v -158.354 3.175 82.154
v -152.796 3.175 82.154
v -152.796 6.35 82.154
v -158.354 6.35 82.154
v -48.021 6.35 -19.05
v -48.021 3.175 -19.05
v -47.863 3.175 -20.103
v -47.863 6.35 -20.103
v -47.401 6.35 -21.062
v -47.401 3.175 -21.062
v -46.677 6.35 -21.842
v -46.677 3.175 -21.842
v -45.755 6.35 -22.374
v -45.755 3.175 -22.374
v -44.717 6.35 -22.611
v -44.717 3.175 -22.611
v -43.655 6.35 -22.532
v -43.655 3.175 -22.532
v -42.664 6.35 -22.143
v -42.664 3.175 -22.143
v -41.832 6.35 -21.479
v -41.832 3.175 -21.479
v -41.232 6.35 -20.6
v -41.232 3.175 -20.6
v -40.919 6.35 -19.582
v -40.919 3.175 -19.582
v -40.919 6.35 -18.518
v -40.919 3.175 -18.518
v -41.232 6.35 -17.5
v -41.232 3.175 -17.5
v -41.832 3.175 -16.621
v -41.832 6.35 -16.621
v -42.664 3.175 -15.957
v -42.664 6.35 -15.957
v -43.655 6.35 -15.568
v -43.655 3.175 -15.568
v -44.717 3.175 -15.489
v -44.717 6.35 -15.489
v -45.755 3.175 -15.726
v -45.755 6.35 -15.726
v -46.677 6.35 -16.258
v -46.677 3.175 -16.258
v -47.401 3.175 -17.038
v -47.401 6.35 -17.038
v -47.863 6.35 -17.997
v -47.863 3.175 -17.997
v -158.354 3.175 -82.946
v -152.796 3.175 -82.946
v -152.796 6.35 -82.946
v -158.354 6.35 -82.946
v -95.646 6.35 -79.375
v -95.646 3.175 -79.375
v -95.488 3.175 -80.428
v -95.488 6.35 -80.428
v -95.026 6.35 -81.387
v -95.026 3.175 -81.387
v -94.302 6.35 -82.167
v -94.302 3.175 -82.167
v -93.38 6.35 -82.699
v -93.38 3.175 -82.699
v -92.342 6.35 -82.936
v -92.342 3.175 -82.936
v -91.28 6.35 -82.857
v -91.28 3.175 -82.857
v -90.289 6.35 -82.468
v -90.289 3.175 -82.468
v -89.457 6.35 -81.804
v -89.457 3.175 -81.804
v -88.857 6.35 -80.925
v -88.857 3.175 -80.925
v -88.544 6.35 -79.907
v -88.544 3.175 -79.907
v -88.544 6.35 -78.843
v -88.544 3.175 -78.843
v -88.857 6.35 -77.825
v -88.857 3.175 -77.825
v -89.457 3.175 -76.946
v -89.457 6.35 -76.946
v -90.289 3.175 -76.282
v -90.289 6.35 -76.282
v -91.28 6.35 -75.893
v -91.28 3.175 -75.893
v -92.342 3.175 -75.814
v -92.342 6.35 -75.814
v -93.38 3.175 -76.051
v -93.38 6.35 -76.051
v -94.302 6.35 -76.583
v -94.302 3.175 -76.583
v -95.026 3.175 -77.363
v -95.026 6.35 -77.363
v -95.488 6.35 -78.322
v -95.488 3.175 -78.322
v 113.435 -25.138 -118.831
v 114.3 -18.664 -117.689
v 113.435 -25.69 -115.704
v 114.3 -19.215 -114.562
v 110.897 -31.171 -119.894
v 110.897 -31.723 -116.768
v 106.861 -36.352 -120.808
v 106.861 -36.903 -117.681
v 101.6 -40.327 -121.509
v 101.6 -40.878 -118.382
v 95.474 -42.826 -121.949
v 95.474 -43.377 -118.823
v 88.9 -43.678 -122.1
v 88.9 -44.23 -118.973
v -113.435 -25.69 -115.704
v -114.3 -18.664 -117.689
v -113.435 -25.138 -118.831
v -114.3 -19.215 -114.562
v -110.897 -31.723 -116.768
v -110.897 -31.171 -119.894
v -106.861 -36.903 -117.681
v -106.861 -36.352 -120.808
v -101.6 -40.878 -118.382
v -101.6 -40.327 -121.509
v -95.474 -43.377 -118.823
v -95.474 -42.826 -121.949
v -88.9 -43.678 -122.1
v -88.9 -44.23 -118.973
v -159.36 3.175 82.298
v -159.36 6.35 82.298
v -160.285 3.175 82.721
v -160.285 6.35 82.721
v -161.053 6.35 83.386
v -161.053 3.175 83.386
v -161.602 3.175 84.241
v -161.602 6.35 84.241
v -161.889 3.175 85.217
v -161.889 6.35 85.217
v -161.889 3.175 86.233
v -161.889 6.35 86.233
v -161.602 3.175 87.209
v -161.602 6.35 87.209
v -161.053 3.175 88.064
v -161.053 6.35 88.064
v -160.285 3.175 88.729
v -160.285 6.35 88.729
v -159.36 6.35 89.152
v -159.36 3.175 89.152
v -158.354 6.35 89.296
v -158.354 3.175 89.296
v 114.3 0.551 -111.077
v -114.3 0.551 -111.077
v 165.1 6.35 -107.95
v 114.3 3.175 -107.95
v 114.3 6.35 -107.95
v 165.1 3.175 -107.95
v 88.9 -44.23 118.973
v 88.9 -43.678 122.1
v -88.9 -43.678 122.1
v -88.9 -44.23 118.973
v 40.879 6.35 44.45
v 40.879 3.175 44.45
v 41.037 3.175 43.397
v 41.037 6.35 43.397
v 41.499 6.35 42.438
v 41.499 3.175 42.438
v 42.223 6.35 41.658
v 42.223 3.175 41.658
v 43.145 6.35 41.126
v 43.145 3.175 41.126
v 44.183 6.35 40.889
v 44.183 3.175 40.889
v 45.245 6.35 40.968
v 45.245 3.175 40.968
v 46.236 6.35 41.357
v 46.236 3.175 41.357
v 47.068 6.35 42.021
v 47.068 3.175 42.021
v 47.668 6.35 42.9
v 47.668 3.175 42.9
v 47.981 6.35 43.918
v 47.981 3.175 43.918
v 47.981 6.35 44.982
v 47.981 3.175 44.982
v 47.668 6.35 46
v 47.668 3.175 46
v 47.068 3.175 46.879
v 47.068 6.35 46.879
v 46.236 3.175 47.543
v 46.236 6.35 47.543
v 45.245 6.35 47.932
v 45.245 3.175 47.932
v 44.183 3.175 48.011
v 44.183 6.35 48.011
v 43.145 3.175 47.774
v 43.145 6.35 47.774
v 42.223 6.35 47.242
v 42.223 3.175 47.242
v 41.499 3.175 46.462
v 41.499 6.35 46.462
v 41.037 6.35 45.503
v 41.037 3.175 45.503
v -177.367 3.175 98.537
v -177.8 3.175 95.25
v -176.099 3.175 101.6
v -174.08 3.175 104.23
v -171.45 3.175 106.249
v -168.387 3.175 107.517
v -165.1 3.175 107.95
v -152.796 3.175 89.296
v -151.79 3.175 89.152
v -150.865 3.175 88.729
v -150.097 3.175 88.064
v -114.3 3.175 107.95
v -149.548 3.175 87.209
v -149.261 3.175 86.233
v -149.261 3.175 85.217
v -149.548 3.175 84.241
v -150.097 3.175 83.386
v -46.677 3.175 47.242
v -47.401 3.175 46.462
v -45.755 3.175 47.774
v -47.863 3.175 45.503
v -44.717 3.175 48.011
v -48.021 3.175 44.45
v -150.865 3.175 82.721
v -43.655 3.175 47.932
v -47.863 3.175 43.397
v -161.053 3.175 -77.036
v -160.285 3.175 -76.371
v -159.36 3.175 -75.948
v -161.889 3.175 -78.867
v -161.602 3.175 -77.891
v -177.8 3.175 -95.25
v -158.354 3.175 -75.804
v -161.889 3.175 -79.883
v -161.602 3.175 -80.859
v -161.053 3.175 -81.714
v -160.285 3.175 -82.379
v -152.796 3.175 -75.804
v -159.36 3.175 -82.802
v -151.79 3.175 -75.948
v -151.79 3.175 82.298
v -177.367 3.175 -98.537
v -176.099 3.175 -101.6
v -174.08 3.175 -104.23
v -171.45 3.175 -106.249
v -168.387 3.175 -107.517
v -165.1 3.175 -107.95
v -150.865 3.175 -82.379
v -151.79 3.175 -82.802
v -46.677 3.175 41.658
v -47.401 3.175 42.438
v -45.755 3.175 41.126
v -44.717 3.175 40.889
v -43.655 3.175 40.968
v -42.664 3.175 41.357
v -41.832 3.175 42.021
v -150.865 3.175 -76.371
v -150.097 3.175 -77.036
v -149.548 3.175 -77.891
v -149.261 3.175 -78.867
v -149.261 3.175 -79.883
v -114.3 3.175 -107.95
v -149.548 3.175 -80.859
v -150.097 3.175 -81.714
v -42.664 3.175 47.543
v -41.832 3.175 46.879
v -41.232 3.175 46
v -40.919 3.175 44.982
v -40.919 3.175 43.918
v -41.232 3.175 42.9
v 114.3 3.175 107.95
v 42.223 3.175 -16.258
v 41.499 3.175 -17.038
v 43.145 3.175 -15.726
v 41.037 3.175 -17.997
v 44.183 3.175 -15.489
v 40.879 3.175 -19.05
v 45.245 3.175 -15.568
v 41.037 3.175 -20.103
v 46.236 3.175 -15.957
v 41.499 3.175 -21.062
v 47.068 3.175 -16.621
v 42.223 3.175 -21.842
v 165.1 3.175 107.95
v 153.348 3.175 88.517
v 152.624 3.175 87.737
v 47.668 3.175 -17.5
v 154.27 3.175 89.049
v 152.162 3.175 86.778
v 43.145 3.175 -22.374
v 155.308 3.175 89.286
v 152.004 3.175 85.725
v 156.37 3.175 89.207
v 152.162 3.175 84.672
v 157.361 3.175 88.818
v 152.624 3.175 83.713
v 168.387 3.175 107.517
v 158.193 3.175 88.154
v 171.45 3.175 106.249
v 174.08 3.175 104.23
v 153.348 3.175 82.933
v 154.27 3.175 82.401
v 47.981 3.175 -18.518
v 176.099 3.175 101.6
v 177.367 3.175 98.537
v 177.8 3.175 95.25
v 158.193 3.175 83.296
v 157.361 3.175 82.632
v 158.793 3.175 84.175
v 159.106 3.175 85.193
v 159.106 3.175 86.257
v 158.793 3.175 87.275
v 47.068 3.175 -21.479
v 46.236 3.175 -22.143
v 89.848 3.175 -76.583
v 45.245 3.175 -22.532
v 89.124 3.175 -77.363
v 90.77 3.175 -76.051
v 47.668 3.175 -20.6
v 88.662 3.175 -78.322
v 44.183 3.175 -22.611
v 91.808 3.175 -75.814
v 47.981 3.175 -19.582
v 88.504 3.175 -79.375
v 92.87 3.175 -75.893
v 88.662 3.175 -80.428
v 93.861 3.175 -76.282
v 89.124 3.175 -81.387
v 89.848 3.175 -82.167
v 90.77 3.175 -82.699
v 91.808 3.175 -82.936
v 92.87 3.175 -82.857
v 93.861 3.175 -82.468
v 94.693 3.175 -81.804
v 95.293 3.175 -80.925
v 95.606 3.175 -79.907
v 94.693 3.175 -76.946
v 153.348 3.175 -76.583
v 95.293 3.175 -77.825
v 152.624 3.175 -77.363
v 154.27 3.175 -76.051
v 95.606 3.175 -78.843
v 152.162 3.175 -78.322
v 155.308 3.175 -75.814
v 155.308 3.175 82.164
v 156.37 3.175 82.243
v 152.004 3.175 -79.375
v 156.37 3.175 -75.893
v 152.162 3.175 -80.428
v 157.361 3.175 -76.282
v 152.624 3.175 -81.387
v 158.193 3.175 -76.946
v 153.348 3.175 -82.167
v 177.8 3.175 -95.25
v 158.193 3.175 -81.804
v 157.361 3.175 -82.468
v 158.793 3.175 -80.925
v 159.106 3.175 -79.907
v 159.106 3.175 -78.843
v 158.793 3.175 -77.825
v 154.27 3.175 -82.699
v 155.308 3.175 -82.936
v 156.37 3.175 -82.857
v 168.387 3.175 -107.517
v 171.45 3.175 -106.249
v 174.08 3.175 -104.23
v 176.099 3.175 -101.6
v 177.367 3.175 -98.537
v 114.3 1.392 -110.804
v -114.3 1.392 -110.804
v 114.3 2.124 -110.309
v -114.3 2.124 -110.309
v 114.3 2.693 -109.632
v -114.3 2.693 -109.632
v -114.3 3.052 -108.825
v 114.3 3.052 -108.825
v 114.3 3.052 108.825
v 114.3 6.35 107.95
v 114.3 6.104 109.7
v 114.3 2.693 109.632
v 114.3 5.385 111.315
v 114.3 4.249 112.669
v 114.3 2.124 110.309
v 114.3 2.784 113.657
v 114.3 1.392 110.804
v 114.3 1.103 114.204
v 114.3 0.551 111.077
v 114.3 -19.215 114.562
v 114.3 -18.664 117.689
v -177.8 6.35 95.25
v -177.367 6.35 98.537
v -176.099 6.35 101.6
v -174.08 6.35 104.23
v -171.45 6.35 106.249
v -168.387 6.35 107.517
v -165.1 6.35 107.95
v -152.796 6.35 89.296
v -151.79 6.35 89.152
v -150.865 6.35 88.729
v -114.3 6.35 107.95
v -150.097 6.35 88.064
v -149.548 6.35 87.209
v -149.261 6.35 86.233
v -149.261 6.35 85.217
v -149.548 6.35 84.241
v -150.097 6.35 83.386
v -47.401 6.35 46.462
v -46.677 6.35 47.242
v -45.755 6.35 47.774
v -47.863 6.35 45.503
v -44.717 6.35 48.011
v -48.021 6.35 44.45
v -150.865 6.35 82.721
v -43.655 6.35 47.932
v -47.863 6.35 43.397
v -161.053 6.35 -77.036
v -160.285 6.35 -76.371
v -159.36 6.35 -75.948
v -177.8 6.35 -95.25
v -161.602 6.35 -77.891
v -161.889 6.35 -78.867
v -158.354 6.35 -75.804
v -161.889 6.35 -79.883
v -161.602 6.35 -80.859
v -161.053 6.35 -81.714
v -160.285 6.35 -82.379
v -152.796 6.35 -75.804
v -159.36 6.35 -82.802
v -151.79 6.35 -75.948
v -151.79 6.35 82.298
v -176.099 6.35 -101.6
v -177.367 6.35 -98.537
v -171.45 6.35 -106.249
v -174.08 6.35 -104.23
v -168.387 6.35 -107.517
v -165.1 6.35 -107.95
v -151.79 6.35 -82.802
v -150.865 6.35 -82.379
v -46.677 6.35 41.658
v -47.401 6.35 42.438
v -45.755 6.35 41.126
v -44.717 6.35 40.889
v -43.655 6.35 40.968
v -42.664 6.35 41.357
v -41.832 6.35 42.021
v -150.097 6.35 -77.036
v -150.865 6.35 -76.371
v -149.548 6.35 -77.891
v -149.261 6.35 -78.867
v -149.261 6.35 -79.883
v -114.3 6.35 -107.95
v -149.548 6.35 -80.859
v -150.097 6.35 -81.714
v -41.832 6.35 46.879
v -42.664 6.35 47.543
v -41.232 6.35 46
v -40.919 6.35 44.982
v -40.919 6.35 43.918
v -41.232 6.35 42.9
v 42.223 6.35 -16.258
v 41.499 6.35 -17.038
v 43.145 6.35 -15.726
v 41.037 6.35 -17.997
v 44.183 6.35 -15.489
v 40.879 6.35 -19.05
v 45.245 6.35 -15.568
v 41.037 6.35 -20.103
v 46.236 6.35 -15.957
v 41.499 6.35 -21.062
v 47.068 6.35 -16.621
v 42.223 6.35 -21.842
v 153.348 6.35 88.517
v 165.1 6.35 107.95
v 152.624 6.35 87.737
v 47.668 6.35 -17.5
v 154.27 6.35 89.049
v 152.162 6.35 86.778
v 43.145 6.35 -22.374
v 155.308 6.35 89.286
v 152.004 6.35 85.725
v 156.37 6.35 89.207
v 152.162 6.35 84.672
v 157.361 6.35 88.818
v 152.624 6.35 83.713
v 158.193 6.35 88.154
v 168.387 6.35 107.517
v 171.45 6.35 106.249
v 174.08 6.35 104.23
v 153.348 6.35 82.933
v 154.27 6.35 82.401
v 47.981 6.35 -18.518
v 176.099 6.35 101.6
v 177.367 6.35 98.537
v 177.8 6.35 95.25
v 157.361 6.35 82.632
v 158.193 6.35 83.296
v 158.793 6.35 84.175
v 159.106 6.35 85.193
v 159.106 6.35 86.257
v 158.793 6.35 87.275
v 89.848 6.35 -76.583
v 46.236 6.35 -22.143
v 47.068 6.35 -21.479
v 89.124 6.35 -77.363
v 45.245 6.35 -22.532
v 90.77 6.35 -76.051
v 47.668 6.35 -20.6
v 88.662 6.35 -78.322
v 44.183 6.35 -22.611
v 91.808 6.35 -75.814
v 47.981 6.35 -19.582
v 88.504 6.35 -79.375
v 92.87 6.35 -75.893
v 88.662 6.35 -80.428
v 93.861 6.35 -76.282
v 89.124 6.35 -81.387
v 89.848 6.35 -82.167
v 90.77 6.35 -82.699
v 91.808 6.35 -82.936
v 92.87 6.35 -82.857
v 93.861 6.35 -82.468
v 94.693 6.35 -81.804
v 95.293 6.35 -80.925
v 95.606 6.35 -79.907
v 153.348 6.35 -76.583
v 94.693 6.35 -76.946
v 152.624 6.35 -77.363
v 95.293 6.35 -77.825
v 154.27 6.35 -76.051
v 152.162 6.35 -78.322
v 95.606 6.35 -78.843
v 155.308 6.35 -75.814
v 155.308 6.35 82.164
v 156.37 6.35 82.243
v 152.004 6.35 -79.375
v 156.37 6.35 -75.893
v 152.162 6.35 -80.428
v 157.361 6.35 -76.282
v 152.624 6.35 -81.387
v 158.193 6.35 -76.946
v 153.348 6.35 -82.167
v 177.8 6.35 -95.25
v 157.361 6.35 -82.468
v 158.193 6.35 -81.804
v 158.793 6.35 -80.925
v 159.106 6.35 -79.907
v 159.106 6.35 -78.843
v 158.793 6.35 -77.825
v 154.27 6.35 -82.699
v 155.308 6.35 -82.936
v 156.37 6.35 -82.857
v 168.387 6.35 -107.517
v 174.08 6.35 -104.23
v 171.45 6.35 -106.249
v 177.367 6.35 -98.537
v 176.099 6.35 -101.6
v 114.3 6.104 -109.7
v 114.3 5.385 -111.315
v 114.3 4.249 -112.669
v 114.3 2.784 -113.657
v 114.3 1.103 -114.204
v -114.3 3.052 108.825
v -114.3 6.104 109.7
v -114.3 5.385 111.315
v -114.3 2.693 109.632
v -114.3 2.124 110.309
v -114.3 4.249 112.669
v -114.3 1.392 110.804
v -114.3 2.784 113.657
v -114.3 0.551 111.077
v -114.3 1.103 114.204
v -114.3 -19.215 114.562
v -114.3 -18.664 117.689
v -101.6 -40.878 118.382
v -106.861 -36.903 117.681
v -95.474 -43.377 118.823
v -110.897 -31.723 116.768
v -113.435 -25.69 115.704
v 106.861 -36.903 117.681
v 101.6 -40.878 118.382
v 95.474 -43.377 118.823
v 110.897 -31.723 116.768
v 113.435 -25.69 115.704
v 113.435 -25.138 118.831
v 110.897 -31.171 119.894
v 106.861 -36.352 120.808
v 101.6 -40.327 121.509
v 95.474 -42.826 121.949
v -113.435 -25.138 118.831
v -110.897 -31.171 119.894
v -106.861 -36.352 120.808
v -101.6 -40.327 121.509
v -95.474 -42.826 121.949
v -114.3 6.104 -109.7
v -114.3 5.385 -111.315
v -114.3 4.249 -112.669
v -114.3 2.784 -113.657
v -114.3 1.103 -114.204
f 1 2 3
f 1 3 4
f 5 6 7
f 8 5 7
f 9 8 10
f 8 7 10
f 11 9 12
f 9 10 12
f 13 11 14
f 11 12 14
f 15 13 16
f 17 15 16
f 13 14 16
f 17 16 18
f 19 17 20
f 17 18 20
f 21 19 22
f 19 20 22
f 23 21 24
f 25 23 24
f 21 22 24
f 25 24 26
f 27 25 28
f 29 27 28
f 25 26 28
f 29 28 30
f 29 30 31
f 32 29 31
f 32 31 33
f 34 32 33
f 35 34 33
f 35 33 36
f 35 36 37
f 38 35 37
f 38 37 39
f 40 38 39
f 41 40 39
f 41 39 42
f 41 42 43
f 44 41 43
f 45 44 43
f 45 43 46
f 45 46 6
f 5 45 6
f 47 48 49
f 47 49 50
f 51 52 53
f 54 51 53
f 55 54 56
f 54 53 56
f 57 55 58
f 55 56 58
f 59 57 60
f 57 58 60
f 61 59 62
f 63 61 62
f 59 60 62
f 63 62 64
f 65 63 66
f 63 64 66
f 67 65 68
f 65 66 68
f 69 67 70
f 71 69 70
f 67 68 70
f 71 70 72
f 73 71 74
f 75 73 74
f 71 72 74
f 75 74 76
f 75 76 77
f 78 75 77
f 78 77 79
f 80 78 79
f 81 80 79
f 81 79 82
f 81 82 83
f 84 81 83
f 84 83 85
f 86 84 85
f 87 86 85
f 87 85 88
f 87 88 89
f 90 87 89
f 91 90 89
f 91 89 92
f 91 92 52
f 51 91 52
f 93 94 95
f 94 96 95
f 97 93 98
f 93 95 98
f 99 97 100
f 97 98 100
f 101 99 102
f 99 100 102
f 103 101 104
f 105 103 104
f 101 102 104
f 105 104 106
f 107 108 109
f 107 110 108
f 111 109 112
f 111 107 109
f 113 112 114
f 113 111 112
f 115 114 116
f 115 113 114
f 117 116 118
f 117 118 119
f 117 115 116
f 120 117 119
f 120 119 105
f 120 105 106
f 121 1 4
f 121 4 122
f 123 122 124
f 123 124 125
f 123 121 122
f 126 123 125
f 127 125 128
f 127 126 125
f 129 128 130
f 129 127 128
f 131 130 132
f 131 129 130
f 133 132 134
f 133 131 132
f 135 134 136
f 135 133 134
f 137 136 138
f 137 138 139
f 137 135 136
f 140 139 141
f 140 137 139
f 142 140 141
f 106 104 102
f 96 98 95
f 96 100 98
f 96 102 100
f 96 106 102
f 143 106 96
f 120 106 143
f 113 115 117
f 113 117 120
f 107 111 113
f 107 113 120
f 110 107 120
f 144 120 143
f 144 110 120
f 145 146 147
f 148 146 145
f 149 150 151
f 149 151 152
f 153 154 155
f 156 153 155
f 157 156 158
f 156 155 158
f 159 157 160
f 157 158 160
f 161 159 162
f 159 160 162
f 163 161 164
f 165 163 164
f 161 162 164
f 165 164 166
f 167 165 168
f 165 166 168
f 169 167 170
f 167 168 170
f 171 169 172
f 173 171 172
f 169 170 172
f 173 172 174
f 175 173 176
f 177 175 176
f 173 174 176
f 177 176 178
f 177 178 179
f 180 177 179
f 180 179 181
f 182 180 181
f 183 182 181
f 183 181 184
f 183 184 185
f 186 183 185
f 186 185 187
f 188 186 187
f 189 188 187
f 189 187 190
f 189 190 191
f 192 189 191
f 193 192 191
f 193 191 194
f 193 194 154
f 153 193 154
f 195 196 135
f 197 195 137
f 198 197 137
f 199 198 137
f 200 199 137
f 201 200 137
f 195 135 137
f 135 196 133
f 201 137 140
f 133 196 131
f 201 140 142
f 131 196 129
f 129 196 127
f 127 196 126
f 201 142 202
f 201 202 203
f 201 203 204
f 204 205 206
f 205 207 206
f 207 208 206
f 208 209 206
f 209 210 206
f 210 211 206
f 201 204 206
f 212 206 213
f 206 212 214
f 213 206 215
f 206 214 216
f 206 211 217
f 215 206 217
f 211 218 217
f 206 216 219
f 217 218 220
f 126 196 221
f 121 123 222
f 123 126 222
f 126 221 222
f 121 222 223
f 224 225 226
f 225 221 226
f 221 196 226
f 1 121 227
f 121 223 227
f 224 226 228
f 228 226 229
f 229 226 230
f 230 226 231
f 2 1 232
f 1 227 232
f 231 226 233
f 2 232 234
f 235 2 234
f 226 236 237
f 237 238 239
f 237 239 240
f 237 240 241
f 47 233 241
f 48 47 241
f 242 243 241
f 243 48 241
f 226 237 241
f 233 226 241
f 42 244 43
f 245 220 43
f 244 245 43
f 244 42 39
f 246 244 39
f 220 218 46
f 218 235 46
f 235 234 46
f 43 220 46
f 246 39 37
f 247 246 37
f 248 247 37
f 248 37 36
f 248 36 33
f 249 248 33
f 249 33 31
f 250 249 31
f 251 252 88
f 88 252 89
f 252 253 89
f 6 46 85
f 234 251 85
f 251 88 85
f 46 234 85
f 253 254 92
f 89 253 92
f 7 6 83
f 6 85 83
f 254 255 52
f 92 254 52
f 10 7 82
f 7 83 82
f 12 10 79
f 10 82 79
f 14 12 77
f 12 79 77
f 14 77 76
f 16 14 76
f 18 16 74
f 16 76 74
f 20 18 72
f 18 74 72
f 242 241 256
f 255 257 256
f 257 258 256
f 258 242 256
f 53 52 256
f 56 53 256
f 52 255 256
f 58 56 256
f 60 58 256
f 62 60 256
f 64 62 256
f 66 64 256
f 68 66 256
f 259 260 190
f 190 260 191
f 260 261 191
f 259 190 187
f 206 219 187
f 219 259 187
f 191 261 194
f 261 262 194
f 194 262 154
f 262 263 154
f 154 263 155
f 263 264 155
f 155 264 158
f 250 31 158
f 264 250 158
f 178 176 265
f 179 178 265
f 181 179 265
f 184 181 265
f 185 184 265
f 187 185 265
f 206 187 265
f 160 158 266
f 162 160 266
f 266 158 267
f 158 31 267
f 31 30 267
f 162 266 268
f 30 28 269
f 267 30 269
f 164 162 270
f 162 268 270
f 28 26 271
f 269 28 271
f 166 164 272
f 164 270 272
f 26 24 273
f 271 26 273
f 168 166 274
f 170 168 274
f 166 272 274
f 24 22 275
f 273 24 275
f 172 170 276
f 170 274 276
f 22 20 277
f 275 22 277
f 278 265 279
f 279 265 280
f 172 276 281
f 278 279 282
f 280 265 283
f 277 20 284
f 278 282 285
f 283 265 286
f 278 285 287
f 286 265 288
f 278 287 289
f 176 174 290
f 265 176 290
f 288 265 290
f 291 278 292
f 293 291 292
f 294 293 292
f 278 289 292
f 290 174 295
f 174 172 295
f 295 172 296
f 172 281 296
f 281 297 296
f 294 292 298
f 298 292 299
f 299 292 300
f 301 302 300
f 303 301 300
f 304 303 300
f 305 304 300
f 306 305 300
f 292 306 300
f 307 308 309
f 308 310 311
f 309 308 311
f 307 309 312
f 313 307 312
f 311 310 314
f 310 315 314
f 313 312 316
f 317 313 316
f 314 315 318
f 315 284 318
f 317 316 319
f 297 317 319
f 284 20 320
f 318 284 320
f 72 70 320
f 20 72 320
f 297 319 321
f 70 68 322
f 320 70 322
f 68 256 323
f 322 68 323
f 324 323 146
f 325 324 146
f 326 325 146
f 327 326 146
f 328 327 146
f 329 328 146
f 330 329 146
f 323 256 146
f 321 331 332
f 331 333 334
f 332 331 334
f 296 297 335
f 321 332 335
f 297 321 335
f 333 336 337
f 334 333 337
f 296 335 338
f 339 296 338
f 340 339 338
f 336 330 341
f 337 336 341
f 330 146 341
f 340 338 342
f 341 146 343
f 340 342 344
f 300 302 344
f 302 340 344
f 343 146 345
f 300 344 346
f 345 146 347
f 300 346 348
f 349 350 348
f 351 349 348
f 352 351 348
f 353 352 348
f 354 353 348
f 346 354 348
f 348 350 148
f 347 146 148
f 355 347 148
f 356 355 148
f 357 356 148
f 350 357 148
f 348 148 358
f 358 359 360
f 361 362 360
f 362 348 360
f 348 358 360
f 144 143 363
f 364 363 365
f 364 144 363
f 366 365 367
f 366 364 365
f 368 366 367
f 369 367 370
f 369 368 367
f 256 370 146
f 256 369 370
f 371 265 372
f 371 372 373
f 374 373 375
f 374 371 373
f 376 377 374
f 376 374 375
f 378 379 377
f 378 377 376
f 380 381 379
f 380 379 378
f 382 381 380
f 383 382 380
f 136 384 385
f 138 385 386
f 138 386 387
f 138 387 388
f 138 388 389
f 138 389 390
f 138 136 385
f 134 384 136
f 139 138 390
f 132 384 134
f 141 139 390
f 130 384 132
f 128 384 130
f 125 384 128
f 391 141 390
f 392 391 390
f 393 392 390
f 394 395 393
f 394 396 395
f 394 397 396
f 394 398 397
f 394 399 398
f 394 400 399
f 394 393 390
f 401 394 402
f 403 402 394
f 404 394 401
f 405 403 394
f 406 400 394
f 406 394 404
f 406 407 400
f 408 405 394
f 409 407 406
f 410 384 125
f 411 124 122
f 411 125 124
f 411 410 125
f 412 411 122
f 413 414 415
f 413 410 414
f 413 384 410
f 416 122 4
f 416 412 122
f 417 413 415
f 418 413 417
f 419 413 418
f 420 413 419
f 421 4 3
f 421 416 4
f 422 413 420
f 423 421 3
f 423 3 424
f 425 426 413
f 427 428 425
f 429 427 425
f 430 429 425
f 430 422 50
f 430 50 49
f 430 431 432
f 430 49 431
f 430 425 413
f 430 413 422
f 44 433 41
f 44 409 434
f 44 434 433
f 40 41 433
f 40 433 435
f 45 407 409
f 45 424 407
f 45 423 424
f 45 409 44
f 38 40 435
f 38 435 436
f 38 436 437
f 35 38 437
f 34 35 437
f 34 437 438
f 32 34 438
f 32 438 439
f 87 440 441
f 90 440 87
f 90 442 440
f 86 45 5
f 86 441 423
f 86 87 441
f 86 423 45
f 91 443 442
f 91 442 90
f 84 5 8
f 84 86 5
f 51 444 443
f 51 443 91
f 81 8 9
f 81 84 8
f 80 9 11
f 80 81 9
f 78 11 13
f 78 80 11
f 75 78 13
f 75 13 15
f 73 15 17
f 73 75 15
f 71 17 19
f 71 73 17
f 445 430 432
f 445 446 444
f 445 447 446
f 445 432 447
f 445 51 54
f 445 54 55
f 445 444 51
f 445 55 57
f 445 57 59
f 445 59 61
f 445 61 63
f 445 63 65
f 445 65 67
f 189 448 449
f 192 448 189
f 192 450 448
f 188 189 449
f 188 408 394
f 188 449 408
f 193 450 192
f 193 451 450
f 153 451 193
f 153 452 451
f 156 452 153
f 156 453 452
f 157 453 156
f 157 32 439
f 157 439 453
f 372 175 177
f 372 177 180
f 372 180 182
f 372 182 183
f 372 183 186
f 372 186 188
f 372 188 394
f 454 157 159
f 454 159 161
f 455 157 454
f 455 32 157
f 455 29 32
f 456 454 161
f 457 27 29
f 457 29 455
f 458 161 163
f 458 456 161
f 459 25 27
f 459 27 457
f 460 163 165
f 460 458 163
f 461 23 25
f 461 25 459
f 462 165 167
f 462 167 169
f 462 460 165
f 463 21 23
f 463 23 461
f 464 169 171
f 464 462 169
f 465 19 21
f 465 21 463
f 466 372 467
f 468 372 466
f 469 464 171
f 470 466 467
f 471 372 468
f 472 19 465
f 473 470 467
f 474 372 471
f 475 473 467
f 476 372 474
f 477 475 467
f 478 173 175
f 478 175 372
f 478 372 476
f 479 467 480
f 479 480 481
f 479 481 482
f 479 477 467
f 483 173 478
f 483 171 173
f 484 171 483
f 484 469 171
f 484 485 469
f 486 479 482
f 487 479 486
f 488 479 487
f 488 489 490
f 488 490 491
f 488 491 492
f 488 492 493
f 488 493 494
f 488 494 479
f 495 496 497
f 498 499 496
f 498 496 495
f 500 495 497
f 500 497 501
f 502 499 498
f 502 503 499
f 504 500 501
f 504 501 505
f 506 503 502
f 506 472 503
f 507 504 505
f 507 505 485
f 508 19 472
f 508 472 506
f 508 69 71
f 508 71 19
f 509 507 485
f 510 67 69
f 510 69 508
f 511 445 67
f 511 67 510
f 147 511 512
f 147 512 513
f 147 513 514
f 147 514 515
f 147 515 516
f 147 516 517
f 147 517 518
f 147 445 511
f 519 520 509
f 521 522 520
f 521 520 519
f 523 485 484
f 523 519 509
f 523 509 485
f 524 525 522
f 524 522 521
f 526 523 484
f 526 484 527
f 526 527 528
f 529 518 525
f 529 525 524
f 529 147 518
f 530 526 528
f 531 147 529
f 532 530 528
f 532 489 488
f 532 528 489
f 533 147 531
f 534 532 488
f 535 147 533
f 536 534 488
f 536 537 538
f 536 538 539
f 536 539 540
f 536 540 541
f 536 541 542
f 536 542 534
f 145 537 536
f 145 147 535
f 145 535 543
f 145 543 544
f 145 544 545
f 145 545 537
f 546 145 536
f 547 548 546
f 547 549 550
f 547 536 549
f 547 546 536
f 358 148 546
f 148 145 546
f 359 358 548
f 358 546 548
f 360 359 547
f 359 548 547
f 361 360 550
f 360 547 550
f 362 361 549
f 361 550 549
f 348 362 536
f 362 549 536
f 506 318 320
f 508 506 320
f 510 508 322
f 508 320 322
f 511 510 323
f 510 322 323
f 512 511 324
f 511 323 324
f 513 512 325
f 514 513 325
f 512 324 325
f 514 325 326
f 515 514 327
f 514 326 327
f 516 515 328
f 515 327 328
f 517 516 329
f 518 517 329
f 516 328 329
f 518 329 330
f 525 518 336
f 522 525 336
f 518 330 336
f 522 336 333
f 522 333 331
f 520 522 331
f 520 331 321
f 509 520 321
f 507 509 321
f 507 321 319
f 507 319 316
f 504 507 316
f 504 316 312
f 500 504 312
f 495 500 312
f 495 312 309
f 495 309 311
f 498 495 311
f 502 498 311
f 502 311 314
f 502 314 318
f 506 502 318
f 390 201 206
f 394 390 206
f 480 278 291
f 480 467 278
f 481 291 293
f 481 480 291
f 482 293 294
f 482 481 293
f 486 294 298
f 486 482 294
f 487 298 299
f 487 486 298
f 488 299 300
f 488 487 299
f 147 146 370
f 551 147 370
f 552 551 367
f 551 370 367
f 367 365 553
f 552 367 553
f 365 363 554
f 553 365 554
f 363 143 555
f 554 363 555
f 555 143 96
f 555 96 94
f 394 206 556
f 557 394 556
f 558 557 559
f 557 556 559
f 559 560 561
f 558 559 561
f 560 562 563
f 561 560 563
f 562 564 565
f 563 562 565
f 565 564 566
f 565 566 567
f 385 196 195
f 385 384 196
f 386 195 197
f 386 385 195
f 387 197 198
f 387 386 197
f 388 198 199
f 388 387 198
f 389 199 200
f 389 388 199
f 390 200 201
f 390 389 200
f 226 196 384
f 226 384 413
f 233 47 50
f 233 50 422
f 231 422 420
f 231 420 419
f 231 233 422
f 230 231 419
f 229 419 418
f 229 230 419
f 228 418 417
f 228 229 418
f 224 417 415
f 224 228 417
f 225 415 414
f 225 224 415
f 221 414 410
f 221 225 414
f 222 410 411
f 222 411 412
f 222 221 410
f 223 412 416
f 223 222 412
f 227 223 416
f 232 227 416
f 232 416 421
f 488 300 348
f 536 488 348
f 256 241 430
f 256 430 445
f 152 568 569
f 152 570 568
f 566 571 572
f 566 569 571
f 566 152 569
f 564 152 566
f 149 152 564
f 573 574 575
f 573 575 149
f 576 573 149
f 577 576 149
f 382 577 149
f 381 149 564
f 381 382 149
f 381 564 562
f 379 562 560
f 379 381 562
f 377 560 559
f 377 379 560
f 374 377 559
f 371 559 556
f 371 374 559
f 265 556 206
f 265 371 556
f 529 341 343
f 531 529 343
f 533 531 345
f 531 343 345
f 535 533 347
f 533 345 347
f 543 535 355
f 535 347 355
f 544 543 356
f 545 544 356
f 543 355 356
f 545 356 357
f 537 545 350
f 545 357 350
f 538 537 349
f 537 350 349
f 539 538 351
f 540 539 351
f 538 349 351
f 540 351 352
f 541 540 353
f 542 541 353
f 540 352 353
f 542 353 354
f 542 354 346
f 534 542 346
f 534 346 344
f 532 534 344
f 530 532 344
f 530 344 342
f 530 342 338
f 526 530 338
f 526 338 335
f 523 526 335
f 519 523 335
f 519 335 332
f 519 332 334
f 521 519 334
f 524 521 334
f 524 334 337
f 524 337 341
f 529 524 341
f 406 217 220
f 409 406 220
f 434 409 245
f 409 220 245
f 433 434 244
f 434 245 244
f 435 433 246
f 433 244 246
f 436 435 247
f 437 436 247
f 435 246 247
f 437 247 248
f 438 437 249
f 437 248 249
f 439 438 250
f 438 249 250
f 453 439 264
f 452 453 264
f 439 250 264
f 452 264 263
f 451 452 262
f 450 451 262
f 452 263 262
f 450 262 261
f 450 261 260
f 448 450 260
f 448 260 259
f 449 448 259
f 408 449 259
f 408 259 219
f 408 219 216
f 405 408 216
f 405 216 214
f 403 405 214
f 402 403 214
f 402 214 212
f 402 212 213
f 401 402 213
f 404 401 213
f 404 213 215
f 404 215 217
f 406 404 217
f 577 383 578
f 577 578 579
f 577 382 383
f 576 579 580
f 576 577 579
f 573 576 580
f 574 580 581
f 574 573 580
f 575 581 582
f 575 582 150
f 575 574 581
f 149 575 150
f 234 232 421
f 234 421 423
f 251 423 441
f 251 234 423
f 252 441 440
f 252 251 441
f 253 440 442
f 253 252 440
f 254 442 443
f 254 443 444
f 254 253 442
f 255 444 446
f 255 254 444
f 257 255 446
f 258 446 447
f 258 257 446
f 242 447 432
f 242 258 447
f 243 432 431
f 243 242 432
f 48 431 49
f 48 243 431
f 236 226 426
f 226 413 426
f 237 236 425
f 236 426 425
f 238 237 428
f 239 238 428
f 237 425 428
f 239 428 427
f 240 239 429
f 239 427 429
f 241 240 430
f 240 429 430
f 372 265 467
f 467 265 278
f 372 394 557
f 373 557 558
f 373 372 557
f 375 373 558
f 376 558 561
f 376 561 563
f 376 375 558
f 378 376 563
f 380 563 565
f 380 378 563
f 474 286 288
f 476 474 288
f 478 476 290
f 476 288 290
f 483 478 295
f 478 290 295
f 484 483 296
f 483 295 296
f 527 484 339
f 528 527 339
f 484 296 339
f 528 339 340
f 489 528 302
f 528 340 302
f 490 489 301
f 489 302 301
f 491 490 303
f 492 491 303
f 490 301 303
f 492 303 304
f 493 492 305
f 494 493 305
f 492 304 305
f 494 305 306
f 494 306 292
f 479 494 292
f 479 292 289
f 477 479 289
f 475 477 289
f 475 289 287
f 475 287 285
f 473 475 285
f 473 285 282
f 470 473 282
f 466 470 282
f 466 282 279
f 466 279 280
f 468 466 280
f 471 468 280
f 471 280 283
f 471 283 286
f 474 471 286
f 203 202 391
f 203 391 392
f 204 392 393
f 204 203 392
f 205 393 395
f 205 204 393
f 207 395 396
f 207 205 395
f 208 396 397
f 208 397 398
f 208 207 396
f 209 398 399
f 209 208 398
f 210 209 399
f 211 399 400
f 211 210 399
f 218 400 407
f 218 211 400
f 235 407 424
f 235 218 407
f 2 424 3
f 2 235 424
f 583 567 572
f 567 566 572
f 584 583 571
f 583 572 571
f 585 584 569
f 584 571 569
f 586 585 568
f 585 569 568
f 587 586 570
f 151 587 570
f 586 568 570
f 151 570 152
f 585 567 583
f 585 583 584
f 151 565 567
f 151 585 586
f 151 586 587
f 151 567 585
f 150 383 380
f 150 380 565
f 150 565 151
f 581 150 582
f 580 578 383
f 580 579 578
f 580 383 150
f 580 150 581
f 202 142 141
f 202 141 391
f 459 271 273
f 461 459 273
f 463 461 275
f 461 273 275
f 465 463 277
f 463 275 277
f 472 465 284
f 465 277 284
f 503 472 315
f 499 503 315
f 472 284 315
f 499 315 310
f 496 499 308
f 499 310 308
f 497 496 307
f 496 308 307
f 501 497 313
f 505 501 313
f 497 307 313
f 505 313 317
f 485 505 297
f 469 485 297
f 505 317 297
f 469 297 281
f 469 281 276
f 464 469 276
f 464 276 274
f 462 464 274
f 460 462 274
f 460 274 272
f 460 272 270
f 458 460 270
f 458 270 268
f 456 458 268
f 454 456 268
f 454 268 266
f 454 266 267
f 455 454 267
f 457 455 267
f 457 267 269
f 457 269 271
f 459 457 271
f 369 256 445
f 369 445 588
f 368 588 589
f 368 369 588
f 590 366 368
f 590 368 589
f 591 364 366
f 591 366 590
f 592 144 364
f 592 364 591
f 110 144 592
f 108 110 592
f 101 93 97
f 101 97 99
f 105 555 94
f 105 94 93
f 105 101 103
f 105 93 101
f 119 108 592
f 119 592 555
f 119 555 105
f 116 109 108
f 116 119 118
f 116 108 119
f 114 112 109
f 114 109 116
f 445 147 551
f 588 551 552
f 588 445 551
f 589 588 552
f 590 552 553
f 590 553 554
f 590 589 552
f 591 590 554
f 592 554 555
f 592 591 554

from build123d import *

# Parameters (mm, degrees)
SKETCH1_W                   = 355.6
SKETCH1_H                   = 215.9
BOSS_EXTRUDE1_DEPTH         = 6.35
CONVERT_SOLID1_OUTLINE_W    = 355.6
CONVERT_SOLID1_OUTLINE_H    = 215.9
CONVERT_SOLID1_DEPTH        = 3.175
F_1_4_CLEARANCE_HOLE1_D     = 7.14248
F_1_4_START                 = 3.175
F_1_4_CLEARANCE_SLOT1_DEPTH = 3.175
EDGE_FLANGE2_DEPTH          = 228.6
EDGE_FLANGE2_BEND_DEPTH     = 228.6
FILLET1_R                   = 12.7
FILLET2_R                   = 25.4


# Read off the part's stored shape, not the designer's step: Convert-Solid1, 1/4 Clearance Slot1
# Sheet-metal steps are written as plain solids
with BuildPart() as part:
    # Sketch1 → Boss-Extrude1 (new body)
    with BuildSketch(Plane(origin=(0, 0, 0), x_dir=(1, 0, 0), z_dir=(0, 1, 0))):
        Rectangle(SKETCH1_W, SKETCH1_H)
    extrude(amount=BOSS_EXTRUDE1_DEPTH)

    # Convert-Solid1 outline → Convert-Solid1 (cut)
    with BuildSketch(Plane(origin=(0, 0, 0), x_dir=(1, 0, 0), z_dir=(0, 1, 0))):
        Rectangle(CONVERT_SOLID1_OUTLINE_W, CONVERT_SOLID1_OUTLINE_H)
    extrude(amount=CONVERT_SOLID1_DEPTH, mode=Mode.SUBTRACT)

    # 1/4 Clearance Hole1 (through all)
    with Locations(Plane(origin=(0, 6.35, 0), x_dir=(1, 0, 0), z_dir=(0, 1, 0))):
        with Locations((-92.075, 79.375), (-44.45, 19.05), (44.45, 19.05), (-44.45, -44.45), (44.45, -44.45), (92.075, 79.375), (155.575, 79.375), (155.575, -85.725)):
            Hole(F_1_4_CLEARANCE_HOLE1_D / 2)

    # 1/4 Clearance Slot1 outline → 1/4 Clearance Slot1 (cut)
    with BuildSketch(Plane(origin=(0, 0, 0), x_dir=(1, 0, 0), z_dir=(0, 1, 0)).offset(F_1_4_START)):
        with BuildLine():
            Line((-158.35376, -89.29624), (-152.79624, -89.29624))
            ThreePointArc((-152.79624, -89.29624), (-149.225, -85.725), (-152.79624, -82.15376))
            Line((-152.79624, -82.15376), (-158.35376, -82.15376))
            ThreePointArc((-158.35376, -82.15376), (-161.925, -85.725), (-158.35376, -89.29624))
        make_face()
        with BuildLine():
            Line((-158.35376, 75.80376), (-152.79624, 75.80376))
            ThreePointArc((-152.79624, 75.80376), (-149.225, 79.375), (-152.79624, 82.94624))
            Line((-152.79624, 82.94624), (-158.35376, 82.94624))
            ThreePointArc((-158.35376, 82.94624), (-161.925, 79.375), (-158.35376, 75.80376))
        make_face()
    extrude(amount=F_1_4_CLEARANCE_SLOT1_DEPTH, mode=Mode.SUBTRACT)

    # Edge-Flange2 section (across the edge) → Edge-Flange2 (add)
    with BuildSketch(Plane(origin=(-114.3, 3.175, -110.614141329), x_dir=(0, -0.17364817766693427, 0.9848077530122075), z_dir=(1, 0, 0))):
        with BuildLine():
            Line((-3.175, 2.664141329), (-3.175, 48.135858671))
            Line((-3.175, 48.135858671), (0, 48.135858671))
            Line((0, 48.135858671), (0, 2.664141329))
            ThreePointArc((0, 2.664141329), (0.742808893, 0.623290668), (2.623667036, -0.462623287))
            Line((2.623667036, -0.462623287), (2.072334072, -3.589387903))
            ThreePointArc((2.072334072, -3.589387903), (-1.689382214, -1.417559993), (-3.175, 2.664141329))
        make_face()
    extrude(amount=EDGE_FLANGE2_DEPTH)

    # Edge-Flange2 section 2 (across the edge) → Edge-Flange2 bend (add)
    with BuildSketch(Plane(origin=(114.3, 3.175, 110.614141329), x_dir=(0, -0.17364817766693427, -0.9848077530122075), z_dir=(-1, 0, 0))):
        with BuildLine():
            Line((-3.175, 2.664141329), (-3.175, 48.135858671))
            Line((-3.175, 48.135858671), (0, 48.135858671))
            Line((0, 48.135858671), (0, 2.664141329))
            ThreePointArc((0, 2.664141329), (0.742808893, 0.623290668), (2.623667036, -0.462623287))
            Line((2.623667036, -0.462623287), (2.072334072, -3.589387903))
            ThreePointArc((2.072334072, -3.589387903), (-1.689382214, -1.417559993), (-3.175, 2.664141329))
        make_face()
    extrude(amount=EDGE_FLANGE2_BEND_DEPTH)

    # Fillet1
    fillet1_edges = [part.edges().sort_by_distance(p)[0] for p in [
        (177.8, 4.7625, -107.95),
        (177.8, 4.7625, 107.95),
        (-177.8, 4.7625, 107.95),
        (-177.8, 4.7625, -107.95),
    ]]
    fillet(fillet1_edges, radius=FILLET1_R)

    # Fillet2
    fillet2_edges = [part.edges().sort_by_distance(p)[0] for p in [
        (-114.3, -43.953900335, -120.536227776),
        (114.3, -43.953900335, -120.536227776),
        (114.3, -43.953900335, 120.536227776),
        (-114.3, -43.953900335, 120.536227776),
    ]]
    fillet(fillet2_edges, radius=FILLET2_R)


solid = part.part
